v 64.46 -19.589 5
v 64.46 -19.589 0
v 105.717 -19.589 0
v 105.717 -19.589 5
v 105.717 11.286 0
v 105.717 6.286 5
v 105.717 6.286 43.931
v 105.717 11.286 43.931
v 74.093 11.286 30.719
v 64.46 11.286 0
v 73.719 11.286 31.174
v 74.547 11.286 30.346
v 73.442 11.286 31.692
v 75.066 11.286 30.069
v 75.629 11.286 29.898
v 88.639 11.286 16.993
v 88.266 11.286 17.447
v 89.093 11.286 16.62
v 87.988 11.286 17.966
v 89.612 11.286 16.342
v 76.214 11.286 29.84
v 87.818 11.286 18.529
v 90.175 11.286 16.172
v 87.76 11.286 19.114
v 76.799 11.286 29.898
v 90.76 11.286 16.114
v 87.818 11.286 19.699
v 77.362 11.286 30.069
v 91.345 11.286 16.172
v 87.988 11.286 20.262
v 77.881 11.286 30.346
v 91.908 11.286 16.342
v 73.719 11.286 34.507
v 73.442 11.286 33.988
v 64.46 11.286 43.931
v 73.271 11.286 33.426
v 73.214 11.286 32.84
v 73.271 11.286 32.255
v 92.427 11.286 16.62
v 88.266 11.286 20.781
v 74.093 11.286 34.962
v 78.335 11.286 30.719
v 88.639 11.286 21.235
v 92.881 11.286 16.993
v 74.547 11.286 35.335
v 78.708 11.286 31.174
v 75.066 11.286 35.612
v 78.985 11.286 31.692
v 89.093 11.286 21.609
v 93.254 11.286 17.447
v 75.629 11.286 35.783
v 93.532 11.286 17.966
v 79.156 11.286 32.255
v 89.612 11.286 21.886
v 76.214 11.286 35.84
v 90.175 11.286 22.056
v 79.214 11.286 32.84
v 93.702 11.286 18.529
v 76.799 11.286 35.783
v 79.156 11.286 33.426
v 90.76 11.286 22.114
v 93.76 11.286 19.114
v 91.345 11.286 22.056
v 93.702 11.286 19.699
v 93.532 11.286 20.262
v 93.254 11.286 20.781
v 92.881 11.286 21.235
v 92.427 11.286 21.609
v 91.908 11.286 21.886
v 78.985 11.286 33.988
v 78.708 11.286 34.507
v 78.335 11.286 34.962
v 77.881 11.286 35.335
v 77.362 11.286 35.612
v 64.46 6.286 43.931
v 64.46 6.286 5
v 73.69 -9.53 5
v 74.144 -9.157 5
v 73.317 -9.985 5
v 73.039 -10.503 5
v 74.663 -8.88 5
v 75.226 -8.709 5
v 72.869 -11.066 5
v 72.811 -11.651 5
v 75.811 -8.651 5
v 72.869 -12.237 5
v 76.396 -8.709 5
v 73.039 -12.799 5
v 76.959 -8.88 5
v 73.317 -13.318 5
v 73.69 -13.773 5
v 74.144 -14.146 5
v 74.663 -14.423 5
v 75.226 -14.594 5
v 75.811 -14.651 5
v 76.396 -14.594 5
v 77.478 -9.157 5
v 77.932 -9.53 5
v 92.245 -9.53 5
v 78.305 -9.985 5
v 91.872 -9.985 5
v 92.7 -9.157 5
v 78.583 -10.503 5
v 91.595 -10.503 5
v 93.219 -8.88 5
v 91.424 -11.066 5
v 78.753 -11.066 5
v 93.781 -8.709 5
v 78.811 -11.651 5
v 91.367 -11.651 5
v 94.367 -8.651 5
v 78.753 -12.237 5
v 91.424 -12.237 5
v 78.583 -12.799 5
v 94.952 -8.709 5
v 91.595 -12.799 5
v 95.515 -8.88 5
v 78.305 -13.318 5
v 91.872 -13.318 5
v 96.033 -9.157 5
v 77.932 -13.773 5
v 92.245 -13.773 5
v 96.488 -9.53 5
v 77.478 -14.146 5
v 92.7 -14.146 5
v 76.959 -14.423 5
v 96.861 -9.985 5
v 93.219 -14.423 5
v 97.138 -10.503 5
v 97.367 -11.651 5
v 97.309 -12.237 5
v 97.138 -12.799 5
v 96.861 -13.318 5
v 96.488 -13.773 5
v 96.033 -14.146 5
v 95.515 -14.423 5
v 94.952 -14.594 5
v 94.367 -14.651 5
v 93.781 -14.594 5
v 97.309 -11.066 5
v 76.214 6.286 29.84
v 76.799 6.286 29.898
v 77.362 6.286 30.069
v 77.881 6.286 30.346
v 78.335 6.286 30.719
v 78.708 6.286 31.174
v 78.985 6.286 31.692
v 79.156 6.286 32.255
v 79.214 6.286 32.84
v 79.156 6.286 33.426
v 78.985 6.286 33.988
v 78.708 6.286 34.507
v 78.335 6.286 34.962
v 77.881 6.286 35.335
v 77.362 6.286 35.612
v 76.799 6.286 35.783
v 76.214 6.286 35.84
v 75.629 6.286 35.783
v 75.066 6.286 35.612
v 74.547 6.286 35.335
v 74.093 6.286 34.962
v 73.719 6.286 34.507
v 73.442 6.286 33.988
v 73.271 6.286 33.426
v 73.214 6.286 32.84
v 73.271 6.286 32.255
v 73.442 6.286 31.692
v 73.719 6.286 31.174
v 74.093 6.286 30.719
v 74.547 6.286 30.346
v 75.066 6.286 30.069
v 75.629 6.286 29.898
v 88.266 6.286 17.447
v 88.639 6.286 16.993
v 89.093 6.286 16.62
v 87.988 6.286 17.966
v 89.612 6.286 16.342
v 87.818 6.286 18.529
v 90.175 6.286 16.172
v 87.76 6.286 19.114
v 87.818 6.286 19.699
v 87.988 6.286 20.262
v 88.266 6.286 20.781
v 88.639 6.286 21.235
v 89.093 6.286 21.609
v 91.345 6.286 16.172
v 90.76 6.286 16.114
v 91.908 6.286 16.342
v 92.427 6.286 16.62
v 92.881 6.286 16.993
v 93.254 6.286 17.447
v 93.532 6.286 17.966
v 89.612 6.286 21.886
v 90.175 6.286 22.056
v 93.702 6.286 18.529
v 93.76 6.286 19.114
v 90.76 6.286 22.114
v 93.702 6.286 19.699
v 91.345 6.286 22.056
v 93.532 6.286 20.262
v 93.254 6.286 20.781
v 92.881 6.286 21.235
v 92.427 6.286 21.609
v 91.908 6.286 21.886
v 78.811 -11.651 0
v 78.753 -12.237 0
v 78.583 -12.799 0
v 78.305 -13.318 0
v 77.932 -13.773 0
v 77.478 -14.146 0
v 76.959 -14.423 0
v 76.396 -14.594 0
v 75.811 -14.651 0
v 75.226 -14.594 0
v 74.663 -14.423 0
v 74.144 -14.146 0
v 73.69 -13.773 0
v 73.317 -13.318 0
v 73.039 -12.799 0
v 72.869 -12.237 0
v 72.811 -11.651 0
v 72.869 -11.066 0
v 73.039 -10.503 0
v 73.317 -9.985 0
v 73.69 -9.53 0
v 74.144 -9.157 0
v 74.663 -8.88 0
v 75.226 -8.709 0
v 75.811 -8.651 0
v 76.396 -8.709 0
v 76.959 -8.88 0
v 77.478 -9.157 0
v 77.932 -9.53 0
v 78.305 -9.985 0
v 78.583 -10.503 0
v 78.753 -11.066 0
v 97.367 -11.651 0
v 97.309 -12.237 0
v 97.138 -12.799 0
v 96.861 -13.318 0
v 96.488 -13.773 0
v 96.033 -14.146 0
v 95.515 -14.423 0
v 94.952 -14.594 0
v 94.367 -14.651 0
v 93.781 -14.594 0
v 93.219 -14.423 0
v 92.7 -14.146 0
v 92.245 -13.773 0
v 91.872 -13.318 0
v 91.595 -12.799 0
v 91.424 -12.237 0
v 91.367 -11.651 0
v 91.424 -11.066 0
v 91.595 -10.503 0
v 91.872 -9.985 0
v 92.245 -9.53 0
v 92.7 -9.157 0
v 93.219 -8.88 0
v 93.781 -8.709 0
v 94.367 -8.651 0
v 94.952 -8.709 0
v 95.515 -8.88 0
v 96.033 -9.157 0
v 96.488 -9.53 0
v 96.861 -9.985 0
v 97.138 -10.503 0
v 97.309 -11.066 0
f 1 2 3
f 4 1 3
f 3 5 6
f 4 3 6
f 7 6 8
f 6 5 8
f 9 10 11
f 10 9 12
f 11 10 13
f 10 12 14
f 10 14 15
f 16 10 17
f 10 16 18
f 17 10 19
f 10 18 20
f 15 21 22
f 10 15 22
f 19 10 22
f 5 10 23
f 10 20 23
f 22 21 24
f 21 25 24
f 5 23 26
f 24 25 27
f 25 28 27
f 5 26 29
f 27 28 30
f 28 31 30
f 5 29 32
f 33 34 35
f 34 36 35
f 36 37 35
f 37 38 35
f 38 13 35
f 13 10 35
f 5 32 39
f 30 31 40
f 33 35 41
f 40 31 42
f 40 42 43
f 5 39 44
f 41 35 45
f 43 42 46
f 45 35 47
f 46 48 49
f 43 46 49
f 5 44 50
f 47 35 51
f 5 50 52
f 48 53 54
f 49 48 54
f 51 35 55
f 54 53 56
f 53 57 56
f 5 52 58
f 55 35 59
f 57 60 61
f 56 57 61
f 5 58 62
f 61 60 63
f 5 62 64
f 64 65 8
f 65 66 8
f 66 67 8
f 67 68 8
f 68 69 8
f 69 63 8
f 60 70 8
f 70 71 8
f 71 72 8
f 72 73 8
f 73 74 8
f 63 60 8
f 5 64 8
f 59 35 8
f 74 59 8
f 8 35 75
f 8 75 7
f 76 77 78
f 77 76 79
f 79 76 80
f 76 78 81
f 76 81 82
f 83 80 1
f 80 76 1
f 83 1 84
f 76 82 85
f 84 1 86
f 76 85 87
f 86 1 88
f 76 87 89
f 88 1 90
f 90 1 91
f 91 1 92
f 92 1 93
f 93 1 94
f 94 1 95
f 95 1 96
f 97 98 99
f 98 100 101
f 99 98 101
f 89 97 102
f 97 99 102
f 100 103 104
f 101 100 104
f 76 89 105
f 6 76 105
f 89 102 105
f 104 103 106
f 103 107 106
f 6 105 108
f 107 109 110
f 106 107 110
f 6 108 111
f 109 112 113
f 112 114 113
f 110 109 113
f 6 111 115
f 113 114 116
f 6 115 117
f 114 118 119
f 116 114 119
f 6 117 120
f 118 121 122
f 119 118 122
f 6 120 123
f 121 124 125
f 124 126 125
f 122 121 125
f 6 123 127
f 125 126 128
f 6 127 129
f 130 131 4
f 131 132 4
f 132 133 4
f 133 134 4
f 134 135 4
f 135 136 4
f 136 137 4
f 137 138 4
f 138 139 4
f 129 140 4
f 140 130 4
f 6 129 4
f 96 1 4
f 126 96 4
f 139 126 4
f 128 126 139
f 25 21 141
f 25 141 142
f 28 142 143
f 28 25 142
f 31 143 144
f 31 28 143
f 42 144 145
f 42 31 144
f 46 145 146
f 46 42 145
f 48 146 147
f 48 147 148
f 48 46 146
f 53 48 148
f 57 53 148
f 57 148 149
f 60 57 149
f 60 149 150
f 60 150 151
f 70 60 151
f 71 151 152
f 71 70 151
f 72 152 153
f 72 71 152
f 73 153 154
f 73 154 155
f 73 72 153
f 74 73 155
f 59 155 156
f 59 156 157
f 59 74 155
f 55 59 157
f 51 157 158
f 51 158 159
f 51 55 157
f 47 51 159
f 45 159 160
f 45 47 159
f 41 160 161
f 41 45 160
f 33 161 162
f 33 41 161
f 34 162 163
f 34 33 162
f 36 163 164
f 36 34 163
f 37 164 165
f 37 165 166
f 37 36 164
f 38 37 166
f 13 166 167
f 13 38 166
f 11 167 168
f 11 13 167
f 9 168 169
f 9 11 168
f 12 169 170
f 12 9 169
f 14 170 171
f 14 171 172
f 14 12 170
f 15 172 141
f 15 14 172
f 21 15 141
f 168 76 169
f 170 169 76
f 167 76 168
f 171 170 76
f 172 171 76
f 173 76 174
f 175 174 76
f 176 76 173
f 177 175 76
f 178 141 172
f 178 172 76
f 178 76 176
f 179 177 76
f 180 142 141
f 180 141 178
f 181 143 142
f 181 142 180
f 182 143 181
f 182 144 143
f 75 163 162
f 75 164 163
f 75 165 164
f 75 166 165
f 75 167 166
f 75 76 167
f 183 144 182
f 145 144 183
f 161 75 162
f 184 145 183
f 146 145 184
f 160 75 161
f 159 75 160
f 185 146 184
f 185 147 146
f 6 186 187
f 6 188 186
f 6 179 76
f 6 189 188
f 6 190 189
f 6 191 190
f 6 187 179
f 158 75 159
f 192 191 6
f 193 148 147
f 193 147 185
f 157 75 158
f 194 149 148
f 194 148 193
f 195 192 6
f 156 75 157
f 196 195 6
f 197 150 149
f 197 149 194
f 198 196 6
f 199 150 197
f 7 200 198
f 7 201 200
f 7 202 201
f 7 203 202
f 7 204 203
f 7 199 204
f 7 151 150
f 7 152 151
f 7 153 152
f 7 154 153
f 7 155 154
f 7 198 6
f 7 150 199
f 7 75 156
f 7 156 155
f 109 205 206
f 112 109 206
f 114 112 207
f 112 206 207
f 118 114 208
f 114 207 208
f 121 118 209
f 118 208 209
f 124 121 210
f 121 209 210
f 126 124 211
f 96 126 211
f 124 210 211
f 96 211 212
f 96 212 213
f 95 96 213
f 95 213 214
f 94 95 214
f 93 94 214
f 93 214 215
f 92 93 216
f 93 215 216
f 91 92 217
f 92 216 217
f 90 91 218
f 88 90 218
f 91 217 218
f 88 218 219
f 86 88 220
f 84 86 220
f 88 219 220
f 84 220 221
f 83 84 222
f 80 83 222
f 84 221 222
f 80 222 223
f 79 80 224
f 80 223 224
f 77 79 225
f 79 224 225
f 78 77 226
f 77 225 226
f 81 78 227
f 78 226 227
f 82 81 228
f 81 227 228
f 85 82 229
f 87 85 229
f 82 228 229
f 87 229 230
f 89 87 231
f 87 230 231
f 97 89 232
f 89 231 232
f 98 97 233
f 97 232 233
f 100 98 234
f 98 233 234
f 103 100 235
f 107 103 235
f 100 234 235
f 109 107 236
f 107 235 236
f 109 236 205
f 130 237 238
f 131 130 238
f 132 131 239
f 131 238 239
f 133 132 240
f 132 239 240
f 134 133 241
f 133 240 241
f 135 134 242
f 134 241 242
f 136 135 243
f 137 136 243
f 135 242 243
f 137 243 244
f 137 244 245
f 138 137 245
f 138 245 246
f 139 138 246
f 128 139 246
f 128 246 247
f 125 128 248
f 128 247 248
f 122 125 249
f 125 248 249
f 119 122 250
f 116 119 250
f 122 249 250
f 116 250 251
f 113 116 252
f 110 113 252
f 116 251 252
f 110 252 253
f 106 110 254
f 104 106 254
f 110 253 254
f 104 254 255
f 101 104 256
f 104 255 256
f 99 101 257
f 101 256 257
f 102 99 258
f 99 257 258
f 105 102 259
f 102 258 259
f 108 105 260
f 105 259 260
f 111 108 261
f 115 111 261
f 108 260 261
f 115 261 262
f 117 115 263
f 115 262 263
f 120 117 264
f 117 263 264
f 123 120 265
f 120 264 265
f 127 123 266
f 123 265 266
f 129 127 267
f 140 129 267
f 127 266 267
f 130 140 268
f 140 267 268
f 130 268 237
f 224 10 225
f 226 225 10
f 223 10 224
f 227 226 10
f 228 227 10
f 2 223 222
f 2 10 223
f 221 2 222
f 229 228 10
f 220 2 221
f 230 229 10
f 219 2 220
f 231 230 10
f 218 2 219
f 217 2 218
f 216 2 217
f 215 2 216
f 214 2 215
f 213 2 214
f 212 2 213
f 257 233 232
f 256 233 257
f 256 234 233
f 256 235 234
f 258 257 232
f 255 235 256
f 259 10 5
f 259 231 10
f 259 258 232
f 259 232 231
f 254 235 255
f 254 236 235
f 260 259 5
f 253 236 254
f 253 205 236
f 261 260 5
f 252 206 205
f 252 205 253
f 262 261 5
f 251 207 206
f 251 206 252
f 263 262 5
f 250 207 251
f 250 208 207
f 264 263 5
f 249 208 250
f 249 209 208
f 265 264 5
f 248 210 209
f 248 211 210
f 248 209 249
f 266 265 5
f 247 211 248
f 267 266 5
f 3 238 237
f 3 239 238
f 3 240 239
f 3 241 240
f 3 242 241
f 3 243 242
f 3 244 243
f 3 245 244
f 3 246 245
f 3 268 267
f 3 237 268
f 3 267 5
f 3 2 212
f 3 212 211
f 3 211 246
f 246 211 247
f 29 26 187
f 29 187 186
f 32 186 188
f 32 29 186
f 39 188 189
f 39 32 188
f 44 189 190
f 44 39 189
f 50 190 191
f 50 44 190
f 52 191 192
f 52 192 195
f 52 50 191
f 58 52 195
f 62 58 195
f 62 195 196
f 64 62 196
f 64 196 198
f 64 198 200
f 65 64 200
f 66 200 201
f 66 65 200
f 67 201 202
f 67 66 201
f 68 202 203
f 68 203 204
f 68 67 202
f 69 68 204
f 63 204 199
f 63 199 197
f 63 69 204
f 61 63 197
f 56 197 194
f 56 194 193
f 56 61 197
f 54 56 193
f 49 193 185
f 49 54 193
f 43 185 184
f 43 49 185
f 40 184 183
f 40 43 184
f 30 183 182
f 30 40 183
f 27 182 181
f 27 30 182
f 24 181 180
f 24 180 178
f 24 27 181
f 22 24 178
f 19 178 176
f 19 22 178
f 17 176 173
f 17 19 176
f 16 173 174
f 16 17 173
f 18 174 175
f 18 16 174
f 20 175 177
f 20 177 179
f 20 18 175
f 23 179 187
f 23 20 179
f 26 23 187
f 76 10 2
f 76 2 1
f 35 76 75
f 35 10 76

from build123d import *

# Parameters (mm, degrees)
SKETCH1_W           = 41.256811376
SKETCH1_H           = 15.875111739
SKETCH1_R           = 3
BOSS_EXTRUDE1_DEPTH = 5
SKETCH2_W           = 41.256811376
SKETCH2_H           = 15
BOSS_EXTRUDE3_DEPTH = 5
SKETCH3_W           = 41.256811376
SKETCH3_H           = 38.931242613
SKETCH3_R           = 3
BOSS_EXTRUDE5_DEPTH = 5


with BuildPart() as part:
    # Sketch1 → Boss-Extrude1 (new body)
    with BuildSketch(Plane.XY):
        with Locations((85.088811215, -27.526454456)):
            Rectangle(SKETCH1_W, SKETCH1_H)
        with Locations((94.366601686, -27.526454455)):
            Circle(SKETCH1_R, mode=Mode.SUBTRACT)
        with Locations((75.811020744, -27.526454455)):
            Circle(SKETCH1_R, mode=Mode.SUBTRACT)
    extrude(amount=BOSS_EXTRUDE1_DEPTH)

    # Sketch2 → Boss-Extrude3 (add)
    with BuildSketch(Plane.XY.offset(5)):
        with Locations((85.088811215, -42.964010325)):
            Rectangle(SKETCH2_W, SKETCH2_H)
    extrude(amount=-BOSS_EXTRUDE3_DEPTH)

    # Sketch3 → Boss-Extrude5 (add)
    with BuildSketch(Plane.XZ.offset(50.464010325)):
        with Locations((85.088811215, 24.465621307)):
            Rectangle(SKETCH3_W, SKETCH3_H)
        with Locations(Location((76.213848726, 32.840318874, 0), (0, 0, 270))):
            Circle(SKETCH3_R, mode=Mode.SUBTRACT)
        with Locations(Location((90.760010617, 19.114096734, 0), (0, 0, 270))):
            Circle(SKETCH3_R, mode=Mode.SUBTRACT)
    extrude(amount=-BOSS_EXTRUDE5_DEPTH)


with BuildPart() as body_2:
    # Mirror1: mirrored copy
    add(part.part.mirror(Plane(origin=(64.460405527, -19.588898586, 5), x_dir=(0, 0, 1), z_dir=(0, -1, 0))))


solid = body_2.part
